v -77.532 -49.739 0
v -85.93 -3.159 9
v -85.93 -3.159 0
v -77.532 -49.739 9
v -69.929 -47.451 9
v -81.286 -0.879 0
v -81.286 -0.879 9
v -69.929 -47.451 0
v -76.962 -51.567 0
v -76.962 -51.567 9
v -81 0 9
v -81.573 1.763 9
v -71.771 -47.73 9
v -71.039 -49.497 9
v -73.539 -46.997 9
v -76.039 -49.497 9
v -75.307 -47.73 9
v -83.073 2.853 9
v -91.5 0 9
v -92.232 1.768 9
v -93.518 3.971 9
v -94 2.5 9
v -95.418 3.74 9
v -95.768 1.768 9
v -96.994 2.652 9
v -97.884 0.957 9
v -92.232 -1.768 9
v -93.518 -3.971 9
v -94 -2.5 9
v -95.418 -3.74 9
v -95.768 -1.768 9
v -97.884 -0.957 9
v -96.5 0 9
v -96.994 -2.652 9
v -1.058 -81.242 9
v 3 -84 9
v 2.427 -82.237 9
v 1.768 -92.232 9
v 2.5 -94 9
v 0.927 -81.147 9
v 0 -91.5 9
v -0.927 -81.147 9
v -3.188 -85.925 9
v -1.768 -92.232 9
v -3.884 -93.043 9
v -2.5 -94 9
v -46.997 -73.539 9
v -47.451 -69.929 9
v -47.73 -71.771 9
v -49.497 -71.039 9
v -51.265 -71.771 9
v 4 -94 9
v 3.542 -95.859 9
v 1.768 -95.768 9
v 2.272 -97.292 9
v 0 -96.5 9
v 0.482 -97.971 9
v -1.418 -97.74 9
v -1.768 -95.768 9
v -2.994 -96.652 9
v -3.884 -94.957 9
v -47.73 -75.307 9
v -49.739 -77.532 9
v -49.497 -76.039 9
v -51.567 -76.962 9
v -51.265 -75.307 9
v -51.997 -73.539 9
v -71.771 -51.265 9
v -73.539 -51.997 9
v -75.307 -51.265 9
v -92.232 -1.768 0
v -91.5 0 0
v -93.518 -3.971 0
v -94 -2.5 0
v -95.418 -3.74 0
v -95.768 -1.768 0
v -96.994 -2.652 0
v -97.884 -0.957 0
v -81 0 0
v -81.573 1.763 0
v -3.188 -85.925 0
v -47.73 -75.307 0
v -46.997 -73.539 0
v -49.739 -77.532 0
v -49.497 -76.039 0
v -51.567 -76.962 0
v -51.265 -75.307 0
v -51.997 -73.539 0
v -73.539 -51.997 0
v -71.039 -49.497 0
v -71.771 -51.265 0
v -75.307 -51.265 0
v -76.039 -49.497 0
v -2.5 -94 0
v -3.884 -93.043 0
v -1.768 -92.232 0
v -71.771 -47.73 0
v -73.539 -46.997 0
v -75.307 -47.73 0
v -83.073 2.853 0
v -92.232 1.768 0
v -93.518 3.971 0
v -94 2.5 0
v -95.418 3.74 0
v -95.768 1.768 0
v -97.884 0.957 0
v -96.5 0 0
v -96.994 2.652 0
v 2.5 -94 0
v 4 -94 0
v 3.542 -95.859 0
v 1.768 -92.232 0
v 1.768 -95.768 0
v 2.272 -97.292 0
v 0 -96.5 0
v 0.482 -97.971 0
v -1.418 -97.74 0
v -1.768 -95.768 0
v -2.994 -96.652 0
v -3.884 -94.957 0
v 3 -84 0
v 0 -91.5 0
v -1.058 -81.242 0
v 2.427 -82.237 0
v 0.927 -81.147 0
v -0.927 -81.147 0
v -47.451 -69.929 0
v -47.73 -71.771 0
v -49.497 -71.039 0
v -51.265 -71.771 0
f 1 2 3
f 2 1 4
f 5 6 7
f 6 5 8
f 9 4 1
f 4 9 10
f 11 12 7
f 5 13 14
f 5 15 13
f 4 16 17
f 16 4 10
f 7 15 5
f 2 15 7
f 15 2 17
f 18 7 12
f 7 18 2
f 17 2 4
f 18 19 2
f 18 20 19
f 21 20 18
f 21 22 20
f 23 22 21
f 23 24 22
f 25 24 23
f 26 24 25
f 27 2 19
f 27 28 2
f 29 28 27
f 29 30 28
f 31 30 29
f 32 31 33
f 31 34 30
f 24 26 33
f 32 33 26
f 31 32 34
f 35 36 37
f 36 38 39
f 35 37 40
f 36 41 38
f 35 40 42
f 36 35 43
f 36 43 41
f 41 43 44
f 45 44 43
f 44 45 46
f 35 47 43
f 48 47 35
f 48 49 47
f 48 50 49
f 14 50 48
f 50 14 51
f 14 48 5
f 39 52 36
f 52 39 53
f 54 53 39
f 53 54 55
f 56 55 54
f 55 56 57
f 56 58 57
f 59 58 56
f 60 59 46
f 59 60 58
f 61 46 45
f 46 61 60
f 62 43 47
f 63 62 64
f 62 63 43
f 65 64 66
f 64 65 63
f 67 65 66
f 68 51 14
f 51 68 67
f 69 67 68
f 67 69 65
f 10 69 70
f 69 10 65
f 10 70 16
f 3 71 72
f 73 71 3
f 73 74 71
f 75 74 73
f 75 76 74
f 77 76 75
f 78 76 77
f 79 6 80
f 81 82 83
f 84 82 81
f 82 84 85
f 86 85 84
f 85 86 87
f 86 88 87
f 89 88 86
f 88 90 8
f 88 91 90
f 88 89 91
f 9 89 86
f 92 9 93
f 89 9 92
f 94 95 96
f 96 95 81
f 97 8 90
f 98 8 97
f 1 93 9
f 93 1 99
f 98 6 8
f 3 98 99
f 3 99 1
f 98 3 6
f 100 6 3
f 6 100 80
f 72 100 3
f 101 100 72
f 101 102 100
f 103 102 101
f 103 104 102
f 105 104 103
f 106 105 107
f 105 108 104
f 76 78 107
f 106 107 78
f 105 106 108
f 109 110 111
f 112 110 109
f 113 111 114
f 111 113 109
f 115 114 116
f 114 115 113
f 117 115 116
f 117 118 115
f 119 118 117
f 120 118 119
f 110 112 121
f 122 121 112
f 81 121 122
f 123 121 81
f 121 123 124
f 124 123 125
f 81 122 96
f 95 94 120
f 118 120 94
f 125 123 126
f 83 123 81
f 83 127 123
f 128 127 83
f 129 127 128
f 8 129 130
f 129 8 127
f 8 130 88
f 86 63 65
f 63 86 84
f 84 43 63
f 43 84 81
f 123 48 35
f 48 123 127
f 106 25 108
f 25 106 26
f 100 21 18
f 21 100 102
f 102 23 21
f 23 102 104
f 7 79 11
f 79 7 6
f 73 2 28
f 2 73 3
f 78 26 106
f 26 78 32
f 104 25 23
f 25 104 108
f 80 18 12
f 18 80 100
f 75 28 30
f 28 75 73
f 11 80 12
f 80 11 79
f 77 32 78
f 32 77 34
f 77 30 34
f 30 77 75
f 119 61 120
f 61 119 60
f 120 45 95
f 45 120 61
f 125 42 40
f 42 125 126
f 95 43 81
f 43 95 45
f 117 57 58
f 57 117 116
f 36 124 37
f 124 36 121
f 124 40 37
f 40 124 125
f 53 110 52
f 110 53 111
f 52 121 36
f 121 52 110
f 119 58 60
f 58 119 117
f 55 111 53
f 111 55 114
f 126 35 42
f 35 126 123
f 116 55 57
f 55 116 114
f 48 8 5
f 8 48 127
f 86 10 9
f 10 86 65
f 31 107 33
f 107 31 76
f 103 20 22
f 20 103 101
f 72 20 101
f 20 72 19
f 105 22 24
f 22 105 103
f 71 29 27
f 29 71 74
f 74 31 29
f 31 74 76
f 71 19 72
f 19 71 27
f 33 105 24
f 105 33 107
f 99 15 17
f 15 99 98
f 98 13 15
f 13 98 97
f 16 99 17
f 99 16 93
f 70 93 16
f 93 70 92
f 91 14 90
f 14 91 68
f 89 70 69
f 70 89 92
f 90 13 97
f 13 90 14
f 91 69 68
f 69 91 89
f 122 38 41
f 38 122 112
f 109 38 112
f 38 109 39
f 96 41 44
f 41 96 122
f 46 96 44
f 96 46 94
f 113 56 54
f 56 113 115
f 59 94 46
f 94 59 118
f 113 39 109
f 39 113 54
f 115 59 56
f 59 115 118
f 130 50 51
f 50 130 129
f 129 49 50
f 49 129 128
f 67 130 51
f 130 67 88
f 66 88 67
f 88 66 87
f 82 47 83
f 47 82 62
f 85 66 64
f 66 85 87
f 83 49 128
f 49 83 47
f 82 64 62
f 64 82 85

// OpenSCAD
module Gestell()
 {
/*     
hull ()
{
translate ([84,0,0]) cylinder (h=9, d=5);
rotate ([0,0,45]) translate ([87,-17,0])  cylinder (h=9, d=8); 
}
*/
hull()
{
translate ([-84,0,0]) cylinder (h=9, d=5);
rotate ([0,0,45]) translate ([-87,17,0])  cylinder (h=9, d=8); 
}
/*
hull()
{
translate ([0,84,0]) cylinder (h=9, d=5);
rotate ([0,0,45]) translate ([87,17,0])  cylinder (h=9, d=8);
}
*/ 
hull()
{
translate ([0,-84,0]) cylinder (h=9, d=5);
rotate ([0,0,45]) translate ([-87,-17,0])  cylinder (h=9, d=8); 
}
 
//
// ^ arme 
//
/*
hull()
{
translate ([94,0,0]) cylinder (h=9, d=8);
translate ([84,0,0]) cylinder (h=9, d=6);
}

hull()
{
translate ([0,94,0]) cylinder (h=9, d=8);
translate ([0,84,0]) cylinder (h=9, d=6);
}
*/
hull()
{    
translate ([-94,0,0]) cylinder (h=9, d=8);
translate ([-84,0,0]) cylinder (h=9, d=6);
}

hull()
{
translate ([0,-94,0]) cylinder (h=9, d=8);
translate ([0,-84,0]) cylinder (h=9, d=6);
}
//
//^chassie Verbindung 
//
/*
hull()
{
    rotate ([0,0,45]) translate ([87,-17,0])  cylinder (h=9, d=8);
    rotate ([0,0,45]) translate ([87,17,0])  cylinder (h=9, d=8);
}
*/
hull()
{
    rotate ([0,0,45]) translate ([-87,17,0])  cylinder (h=9, d=8); 
    rotate ([0,0,45]) translate ([-87,-17,0])  cylinder (h=9, d=8); 
}
//
// ^Verbindung Platinenteil 
//

}



difference()
{
//    
//  Loecher  
//    
    Gestell();


    translate ([94,0,0]) cylinder (h=9, d=5);
    rotate ([0,0,45]) translate ([87,-17,0])  cylinder (h=9, d=5); 
    translate ([-94,0,0]) cylinder (h=9, d=5);
    rotate ([0,0,45]) translate ([-87,17,0])  cylinder (h=9, d=5);
    translate ([0,-94,0]) cylinder (h=9, d=5);
    rotate ([0,0,45]) translate ([-87,-17,0])  cylinder (h=9, d=5); 
    translate ([0,94,0]) cylinder (h=9, d=5);
    rotate ([0,0,45]) translate ([87,17,0])  cylinder (h=9, d=5);
}
